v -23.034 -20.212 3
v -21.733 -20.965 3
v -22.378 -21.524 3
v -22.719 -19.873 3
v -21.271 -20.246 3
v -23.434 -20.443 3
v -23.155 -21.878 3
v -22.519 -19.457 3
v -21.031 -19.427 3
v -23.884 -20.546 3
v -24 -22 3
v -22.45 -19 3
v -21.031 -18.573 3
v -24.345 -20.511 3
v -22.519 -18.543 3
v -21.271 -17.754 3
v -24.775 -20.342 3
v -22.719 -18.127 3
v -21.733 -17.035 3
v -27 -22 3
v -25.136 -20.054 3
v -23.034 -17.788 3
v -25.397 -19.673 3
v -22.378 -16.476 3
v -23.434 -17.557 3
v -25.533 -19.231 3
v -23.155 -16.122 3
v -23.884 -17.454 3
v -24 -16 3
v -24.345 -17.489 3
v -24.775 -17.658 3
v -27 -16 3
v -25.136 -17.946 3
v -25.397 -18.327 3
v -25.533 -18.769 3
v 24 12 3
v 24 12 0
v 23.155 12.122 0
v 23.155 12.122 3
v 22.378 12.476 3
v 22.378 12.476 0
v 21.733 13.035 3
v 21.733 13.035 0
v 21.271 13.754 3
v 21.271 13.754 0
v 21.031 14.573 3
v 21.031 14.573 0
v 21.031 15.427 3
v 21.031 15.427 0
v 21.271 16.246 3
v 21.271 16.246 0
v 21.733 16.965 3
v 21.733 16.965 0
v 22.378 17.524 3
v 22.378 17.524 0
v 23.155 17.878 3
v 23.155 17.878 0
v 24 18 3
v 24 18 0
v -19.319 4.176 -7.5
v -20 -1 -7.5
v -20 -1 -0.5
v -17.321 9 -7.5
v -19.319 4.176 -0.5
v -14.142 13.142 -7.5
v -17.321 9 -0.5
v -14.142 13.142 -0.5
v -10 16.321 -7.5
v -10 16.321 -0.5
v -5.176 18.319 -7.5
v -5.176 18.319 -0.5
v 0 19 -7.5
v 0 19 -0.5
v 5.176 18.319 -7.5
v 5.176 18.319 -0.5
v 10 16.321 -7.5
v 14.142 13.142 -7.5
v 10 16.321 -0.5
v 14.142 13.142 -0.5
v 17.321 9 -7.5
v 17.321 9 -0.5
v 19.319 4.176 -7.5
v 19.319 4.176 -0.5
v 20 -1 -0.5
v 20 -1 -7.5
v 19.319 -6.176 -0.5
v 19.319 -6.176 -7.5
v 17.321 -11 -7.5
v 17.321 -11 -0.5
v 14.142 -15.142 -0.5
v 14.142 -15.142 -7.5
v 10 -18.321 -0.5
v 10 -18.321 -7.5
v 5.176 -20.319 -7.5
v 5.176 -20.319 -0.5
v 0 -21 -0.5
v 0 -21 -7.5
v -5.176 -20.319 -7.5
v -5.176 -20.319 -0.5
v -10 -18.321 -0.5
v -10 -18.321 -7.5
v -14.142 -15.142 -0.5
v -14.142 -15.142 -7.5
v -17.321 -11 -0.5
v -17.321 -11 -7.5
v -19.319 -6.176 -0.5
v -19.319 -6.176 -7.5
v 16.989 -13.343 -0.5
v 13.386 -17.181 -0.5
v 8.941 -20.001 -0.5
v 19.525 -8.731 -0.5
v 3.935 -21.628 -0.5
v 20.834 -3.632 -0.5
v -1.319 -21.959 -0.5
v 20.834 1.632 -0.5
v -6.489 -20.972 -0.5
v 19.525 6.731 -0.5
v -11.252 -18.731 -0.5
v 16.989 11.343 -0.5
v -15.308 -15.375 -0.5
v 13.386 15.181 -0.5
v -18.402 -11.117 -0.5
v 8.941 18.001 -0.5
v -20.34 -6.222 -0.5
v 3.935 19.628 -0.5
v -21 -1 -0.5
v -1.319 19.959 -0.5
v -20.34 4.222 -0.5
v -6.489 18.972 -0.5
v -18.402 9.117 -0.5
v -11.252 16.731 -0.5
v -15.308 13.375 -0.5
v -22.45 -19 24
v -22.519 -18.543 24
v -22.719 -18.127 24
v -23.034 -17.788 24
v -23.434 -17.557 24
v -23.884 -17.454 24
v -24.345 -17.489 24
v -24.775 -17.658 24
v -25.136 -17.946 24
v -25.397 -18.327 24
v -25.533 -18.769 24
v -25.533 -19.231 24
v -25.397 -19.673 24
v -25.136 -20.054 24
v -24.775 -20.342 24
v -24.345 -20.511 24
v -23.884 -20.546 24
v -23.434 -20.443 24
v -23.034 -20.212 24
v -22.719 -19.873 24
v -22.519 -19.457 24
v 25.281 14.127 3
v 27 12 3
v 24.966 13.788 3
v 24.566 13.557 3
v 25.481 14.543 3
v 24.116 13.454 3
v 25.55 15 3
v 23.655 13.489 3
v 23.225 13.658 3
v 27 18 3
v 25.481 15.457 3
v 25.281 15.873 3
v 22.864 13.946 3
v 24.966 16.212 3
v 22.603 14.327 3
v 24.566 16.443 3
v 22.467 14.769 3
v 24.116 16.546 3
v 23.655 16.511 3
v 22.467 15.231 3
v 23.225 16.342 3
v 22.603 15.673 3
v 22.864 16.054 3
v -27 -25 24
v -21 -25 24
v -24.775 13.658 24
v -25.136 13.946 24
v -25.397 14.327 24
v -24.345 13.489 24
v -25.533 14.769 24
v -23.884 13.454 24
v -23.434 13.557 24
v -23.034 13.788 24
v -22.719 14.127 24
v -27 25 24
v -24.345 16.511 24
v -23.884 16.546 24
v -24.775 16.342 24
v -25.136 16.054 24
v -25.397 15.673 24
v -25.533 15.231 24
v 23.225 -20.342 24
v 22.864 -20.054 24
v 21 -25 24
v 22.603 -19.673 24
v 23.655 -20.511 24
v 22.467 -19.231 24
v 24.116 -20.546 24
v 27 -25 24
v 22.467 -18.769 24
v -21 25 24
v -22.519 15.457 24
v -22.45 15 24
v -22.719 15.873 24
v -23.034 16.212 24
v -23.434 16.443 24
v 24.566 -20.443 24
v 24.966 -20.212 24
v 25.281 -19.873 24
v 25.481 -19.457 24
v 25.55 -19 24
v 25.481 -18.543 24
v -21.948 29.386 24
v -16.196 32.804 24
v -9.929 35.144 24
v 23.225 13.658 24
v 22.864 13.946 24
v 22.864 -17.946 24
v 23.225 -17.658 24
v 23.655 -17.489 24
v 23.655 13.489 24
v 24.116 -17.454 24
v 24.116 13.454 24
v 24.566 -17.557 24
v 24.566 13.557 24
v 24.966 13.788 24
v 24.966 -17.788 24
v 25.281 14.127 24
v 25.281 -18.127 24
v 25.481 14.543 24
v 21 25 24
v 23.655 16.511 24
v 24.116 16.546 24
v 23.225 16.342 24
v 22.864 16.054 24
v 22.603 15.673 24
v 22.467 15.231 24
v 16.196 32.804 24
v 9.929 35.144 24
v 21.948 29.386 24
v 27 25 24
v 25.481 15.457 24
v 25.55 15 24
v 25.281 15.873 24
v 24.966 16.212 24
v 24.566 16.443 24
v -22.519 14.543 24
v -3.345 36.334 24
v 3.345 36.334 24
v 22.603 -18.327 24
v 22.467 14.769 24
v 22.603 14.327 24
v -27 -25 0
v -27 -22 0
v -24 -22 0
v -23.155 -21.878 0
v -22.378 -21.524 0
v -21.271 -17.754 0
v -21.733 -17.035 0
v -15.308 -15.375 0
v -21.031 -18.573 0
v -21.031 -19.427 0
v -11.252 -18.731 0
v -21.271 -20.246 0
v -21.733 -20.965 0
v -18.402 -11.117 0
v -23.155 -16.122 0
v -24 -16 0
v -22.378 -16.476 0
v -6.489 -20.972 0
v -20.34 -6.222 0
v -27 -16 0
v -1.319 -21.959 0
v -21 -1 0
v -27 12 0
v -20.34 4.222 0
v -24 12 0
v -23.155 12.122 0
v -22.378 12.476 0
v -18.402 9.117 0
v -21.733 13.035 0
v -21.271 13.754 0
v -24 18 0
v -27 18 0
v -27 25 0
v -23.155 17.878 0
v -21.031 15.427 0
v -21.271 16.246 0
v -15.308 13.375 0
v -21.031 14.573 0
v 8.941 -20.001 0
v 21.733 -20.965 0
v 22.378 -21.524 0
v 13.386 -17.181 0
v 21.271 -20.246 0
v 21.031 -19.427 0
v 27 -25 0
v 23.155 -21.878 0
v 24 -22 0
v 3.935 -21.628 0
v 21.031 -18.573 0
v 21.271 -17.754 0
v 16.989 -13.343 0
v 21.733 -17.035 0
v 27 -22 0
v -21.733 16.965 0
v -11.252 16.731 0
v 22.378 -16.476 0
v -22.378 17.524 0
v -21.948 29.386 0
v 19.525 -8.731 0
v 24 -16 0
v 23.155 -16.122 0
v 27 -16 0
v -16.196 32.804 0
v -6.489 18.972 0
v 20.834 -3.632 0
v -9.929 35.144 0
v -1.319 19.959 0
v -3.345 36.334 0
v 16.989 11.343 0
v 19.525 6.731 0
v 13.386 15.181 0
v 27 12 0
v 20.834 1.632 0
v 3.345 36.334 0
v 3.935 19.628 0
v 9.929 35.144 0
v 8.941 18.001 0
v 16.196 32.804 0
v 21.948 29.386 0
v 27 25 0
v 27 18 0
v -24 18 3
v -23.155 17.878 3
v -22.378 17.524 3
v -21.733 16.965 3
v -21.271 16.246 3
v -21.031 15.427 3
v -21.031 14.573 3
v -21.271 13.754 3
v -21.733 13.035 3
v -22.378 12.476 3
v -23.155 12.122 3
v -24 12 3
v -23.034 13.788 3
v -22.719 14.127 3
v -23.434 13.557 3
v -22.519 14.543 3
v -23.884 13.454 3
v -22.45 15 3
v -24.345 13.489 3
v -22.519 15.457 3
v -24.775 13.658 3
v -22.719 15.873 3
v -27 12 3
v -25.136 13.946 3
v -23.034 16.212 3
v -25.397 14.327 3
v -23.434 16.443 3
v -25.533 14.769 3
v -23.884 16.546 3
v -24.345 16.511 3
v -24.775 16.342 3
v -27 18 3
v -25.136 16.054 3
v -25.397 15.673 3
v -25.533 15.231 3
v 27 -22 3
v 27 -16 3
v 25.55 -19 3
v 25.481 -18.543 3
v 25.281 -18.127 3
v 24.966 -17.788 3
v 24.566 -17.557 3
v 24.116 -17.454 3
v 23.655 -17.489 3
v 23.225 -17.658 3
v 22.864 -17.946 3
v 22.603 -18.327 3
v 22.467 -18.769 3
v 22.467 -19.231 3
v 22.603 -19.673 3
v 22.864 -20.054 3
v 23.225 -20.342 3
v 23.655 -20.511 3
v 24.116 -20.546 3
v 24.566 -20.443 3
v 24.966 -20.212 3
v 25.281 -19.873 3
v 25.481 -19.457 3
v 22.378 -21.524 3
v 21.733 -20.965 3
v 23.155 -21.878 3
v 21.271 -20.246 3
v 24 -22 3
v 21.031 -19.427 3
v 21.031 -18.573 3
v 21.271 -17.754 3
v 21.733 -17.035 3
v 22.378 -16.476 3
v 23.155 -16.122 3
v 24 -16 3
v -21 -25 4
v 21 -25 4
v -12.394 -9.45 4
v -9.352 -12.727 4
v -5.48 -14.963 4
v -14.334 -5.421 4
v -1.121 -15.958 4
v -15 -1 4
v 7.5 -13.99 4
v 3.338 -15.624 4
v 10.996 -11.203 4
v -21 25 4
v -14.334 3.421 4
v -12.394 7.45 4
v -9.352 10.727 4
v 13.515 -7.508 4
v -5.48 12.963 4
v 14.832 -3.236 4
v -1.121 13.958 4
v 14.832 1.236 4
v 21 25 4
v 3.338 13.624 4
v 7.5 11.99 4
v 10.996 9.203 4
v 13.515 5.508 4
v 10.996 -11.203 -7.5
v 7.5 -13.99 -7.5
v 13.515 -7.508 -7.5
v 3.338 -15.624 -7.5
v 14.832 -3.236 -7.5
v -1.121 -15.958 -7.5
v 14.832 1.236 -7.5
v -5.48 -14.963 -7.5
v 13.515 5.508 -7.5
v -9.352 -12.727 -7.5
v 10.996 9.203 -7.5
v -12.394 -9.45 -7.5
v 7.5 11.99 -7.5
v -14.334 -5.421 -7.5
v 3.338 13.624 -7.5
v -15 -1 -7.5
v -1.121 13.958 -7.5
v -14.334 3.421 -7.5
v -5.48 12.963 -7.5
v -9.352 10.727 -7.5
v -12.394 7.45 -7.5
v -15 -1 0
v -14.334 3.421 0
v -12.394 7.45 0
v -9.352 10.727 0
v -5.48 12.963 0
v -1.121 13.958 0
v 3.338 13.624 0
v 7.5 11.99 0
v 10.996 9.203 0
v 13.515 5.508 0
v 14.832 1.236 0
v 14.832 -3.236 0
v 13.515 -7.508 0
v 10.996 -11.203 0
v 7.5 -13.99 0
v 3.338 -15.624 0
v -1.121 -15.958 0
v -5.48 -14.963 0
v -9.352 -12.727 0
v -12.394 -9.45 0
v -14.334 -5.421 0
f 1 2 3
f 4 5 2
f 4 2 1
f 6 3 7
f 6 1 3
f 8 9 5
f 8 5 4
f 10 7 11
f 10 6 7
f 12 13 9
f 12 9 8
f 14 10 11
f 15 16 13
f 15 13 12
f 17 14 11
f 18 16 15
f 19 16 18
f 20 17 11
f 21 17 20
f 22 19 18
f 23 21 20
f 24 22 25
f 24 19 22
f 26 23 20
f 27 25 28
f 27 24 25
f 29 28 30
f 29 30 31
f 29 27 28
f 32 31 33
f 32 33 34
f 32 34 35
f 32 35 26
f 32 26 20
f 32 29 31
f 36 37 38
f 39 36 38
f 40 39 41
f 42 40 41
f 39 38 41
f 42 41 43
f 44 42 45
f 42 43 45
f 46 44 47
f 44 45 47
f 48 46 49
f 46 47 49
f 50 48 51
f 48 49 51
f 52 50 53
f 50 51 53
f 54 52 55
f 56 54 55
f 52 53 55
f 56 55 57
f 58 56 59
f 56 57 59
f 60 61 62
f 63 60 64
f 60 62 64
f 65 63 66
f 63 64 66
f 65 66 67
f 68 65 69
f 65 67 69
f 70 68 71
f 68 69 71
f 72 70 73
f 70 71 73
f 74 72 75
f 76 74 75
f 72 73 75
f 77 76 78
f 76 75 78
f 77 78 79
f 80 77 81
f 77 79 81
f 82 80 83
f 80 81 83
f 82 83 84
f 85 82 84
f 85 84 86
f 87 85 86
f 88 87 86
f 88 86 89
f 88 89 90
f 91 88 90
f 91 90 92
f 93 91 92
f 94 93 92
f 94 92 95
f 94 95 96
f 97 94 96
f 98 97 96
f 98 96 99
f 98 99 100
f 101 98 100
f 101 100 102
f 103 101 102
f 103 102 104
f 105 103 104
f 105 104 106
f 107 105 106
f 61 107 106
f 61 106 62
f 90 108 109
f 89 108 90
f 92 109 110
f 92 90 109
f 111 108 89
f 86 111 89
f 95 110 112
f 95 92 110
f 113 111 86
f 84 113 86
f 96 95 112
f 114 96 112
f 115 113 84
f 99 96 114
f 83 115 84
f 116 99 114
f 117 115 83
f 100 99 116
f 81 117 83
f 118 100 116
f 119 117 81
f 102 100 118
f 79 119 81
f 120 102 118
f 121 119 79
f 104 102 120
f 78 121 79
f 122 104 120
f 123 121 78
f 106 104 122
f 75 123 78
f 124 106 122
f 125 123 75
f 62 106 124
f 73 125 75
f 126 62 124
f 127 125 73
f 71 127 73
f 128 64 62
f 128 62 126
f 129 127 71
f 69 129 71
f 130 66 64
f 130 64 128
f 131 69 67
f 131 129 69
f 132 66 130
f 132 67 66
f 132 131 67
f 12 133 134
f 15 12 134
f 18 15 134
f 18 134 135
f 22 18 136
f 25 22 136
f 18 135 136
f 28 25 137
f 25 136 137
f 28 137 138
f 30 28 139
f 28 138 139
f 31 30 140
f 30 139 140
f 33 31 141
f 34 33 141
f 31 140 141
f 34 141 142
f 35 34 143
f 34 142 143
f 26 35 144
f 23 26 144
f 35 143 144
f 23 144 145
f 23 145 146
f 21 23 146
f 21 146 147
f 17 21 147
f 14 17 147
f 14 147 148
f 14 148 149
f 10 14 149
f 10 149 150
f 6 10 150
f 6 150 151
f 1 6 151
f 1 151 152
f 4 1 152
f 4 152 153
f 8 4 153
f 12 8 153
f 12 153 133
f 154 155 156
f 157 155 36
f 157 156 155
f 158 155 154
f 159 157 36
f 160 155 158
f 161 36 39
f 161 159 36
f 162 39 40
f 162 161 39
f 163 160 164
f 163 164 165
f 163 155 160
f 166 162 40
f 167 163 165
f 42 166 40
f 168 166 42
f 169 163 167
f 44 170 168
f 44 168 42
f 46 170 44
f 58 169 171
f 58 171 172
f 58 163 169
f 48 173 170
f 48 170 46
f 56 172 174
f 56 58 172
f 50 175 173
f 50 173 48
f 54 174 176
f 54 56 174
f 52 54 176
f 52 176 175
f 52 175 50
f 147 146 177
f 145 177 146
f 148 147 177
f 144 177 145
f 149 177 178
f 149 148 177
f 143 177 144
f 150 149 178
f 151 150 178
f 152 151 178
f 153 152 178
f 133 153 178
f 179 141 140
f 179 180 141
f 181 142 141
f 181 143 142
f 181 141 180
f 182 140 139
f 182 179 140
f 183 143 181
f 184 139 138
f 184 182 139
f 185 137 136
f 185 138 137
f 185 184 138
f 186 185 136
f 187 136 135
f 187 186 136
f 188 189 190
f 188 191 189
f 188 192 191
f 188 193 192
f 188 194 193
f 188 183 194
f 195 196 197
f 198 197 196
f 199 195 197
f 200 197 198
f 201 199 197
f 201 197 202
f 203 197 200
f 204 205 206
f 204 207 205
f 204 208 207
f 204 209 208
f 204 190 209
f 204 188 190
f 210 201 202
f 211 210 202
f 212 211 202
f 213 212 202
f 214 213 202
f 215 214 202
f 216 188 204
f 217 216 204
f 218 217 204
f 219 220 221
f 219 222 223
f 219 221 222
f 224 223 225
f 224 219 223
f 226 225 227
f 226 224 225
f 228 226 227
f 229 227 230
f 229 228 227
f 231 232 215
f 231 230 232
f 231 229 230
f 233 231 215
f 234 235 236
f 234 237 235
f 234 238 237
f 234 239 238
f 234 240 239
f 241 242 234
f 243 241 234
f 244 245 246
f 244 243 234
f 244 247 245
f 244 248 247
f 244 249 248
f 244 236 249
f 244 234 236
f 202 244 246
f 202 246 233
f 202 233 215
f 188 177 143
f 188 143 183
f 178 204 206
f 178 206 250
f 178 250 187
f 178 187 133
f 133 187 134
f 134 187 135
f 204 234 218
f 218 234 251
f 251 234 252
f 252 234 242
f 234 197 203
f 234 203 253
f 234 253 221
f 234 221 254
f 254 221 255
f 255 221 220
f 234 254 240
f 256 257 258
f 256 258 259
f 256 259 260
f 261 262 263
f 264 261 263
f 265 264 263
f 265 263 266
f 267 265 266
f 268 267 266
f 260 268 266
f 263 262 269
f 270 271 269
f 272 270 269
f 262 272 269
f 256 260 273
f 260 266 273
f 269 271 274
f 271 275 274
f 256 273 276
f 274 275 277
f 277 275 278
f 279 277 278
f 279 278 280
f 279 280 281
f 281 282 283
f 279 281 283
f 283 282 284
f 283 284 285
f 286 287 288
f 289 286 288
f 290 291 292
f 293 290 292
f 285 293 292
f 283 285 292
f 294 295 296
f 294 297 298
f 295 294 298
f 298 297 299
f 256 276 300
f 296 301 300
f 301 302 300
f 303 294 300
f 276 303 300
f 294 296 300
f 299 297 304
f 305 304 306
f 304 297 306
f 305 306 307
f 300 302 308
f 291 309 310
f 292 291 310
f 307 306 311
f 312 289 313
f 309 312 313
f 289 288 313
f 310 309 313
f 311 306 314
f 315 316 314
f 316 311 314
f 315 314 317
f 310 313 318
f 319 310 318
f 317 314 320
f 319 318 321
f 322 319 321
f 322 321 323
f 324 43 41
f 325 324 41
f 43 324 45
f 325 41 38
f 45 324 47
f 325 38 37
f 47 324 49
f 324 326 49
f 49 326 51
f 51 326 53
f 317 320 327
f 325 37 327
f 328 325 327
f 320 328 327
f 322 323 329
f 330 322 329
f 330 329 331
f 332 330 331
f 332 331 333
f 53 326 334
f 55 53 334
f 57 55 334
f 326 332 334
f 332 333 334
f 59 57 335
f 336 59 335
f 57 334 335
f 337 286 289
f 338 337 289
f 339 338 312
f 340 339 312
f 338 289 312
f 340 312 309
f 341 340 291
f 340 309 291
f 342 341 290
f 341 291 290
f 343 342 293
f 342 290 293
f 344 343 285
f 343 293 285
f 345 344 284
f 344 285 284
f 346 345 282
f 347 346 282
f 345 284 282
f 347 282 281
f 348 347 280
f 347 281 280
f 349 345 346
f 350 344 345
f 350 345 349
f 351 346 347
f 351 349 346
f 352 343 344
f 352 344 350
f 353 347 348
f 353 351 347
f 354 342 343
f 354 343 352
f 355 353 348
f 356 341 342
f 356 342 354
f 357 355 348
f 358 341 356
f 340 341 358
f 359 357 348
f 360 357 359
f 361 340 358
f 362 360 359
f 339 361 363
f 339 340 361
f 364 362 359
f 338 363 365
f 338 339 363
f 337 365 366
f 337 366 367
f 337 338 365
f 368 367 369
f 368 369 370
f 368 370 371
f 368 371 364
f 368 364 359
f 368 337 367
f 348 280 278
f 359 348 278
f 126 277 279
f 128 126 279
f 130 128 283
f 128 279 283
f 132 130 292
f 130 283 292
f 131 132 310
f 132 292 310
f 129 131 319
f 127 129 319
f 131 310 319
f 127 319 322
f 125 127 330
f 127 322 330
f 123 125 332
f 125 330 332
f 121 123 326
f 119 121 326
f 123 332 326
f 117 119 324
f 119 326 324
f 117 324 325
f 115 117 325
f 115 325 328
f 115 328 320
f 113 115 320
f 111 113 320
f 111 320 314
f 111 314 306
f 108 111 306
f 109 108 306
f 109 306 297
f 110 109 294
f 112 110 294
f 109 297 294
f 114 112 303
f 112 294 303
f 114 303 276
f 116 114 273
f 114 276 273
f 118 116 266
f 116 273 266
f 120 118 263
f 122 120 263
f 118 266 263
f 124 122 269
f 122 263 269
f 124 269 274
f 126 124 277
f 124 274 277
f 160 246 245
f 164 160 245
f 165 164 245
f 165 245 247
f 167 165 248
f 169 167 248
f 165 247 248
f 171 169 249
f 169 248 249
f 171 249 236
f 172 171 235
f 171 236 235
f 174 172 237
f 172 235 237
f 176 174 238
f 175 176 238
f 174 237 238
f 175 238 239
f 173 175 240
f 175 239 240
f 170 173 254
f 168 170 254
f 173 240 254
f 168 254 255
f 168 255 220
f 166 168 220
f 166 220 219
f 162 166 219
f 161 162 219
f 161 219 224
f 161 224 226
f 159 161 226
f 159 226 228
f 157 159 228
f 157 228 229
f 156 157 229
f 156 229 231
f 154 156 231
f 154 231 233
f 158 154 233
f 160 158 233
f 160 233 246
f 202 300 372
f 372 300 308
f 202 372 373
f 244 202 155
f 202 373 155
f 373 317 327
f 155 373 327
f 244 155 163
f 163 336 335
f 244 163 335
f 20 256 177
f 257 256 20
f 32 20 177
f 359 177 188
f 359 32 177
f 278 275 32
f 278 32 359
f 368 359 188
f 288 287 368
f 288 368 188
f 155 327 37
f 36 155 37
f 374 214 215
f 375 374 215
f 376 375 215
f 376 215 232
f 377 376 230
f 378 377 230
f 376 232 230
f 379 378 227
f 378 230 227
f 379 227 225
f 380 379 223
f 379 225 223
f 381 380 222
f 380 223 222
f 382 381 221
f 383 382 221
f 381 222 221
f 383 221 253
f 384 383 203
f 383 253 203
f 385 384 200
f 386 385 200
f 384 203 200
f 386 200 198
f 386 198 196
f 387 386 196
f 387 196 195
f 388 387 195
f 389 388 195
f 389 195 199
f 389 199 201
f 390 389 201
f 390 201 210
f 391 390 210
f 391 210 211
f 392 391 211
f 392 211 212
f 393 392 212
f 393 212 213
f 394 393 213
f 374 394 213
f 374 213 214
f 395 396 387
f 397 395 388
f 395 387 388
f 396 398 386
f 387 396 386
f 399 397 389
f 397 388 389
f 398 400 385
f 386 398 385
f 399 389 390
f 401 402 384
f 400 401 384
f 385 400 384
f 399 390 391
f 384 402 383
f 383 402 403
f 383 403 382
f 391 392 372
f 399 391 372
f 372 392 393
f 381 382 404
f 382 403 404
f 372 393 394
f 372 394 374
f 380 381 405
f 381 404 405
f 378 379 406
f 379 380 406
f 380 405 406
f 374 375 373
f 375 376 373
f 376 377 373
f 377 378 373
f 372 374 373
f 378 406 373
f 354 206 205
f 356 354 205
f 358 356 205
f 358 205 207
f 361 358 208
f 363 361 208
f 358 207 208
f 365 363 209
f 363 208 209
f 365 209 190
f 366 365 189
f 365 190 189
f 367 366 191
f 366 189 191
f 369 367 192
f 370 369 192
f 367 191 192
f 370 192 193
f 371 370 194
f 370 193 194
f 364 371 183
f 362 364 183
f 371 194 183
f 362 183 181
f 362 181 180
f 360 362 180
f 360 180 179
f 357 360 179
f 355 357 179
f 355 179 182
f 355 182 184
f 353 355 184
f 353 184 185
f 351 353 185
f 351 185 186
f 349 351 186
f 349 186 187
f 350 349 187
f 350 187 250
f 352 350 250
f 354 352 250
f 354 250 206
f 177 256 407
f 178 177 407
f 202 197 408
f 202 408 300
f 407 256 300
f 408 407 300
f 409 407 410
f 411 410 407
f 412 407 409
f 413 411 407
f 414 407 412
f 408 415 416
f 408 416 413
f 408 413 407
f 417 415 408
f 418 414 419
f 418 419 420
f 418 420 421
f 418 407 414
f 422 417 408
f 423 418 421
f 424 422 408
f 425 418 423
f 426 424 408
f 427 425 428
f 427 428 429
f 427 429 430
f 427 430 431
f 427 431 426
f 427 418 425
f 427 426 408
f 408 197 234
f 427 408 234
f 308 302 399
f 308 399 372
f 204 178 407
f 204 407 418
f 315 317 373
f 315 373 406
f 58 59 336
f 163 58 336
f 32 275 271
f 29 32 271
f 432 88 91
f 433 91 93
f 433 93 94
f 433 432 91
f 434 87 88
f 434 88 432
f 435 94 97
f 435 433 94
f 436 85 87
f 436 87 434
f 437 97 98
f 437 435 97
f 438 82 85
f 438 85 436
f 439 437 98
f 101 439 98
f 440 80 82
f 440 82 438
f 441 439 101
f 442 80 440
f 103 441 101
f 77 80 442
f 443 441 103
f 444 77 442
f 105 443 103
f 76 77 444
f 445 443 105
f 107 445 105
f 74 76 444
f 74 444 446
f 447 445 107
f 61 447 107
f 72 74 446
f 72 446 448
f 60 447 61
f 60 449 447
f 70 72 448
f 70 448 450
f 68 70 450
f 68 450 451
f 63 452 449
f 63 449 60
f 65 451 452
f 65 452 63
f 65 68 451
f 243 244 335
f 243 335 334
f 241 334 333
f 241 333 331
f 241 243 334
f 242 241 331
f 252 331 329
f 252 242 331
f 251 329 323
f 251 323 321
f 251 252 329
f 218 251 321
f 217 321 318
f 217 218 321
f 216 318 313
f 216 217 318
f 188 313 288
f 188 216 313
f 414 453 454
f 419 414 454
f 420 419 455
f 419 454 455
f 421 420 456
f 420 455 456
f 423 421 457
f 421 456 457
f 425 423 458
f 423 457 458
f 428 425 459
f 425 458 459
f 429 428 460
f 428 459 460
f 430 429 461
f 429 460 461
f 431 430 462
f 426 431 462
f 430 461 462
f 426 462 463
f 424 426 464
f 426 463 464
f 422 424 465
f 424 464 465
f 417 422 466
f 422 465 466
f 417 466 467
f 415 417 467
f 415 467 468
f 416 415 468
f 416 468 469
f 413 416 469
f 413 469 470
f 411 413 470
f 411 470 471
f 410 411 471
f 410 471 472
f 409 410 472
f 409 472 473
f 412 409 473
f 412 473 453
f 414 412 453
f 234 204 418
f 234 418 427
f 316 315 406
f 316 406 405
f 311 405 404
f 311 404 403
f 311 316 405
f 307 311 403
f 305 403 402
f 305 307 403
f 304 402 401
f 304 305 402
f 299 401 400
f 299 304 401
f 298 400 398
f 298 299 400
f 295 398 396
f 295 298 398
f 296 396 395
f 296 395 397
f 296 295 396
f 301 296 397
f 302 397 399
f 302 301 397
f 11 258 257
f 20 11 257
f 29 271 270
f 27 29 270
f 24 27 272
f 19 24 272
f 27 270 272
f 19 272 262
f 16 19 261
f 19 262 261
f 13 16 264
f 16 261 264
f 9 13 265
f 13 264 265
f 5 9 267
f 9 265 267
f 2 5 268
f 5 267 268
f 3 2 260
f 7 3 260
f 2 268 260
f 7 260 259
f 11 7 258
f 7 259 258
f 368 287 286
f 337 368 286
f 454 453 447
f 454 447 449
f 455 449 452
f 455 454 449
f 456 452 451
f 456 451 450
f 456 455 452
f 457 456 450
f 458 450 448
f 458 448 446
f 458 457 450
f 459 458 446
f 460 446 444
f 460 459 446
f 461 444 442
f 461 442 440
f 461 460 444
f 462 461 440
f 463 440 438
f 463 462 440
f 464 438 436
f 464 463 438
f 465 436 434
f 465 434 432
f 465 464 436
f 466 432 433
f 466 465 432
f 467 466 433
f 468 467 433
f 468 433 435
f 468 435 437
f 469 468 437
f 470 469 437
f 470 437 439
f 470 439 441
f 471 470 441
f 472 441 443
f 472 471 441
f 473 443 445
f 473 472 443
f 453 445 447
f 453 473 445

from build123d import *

# Parameters (mm, degrees)
SKETCH_1_W          = 54
SKETCH_1_H          = 50
EXTRUDE_1_DEPTH     = 24
SKETCH_2_R          = 1.55
CUT_EXTRUDE_1_DEPTH = 25
EXTRUDE_2_DEPTH     = 24
SKETCH_5_W          = 42
SKETCH_5_H          = 50
CUT_EXTRUDE_3_DEPTH = 20
CUT_EXTRUDE_4_DEPTH = 3
SKETCH_7_R          = 15
CUT_EXTRUDE_5_DEPTH = 25
SKETCH_11_R         = 20
SKETCH_11_R_2       = 15
EXTRUDE_3_DEPTH     = 7.5
SKETCH_12_R         = 21
SKETCH_12_R_2       = 20
EXTRUDE_4_DEPTH     = 0.5


with BuildPart() as part:
    # 草图1 → 凸台-拉伸1 (new body)
    with BuildSketch(Plane.XY):
        Rectangle(SKETCH_1_W, SKETCH_1_H)
    extrude(amount=EXTRUDE_1_DEPTH)

    # 草图2 → 切除-拉伸1 (cut, through all)
    with BuildSketch(Plane.XY.offset(24)):
        with Locations((-24, 15)):
            Circle(SKETCH_2_R)
        with Locations((24, 15)):
            Circle(SKETCH_2_R)
        with Locations((24, -19)):
            Circle(SKETCH_2_R)
        with Locations((-24, -19)):
            Circle(SKETCH_2_R)
    extrude(amount=-CUT_EXTRUDE_1_DEPTH, mode=Mode.SUBTRACT)

    # 草图3 → 凸台-拉伸2 (add)
    with BuildSketch(Plane.XY.offset(24)):
        with BuildLine():
            Line((-27, 25), (27, 25))
            ThreePointArc((27, 25), (0, 36.483329628), (-27, 25))
        make_face()
    extrude(amount=-EXTRUDE_2_DEPTH)

    # 草图5 → 切除-拉伸3 (cut)
    with BuildSketch(Plane.XY.offset(24)):
        Rectangle(SKETCH_5_W, SKETCH_5_H)
    extrude(amount=-CUT_EXTRUDE_3_DEPTH, mode=Mode.SUBTRACT)

    # 草图6 → 切除-拉伸4 (cut)
    with BuildSketch(Plane(origin=(0, 0, 0), x_dir=(-1, 0, 0), z_dir=(0, 0, -1))):
        with BuildLine():
            Line((-27, -16), (-24, -16))
            ThreePointArc((-24, -16), (-21, -19), (-24, -22))
            Line((-24, -22), (-27, -22))
            Line((-27, -22), (-27, -16))
        make_face()
        with BuildLine():
            Line((-27, 18), (-27, 12))
            Line((-27, 12), (-24, 12))
            ThreePointArc((-24, 12), (-21, 15), (-24, 18))
            Line((-24, 18), (-27, 18))
        make_face()
        with BuildLine():
            Line((27, -16), (24, -16))
            ThreePointArc((24, -16), (21, -19), (24, -22))
            Line((24, -22), (27, -22))
            Line((27, -22), (27, -16))
        make_face()
        with BuildLine():
            Line((27, 18), (24, 18))
            ThreePointArc((24, 18), (21, 15), (24, 12))
            Line((24, 12), (27, 12))
            Line((27, 12), (27, 18))
        make_face()
    extrude(amount=-CUT_EXTRUDE_4_DEPTH, mode=Mode.SUBTRACT)

    # 草图7 → 切除-拉伸5 (cut, through all)
    with BuildSketch(Plane(origin=(0, 0, 0), x_dir=(-1, 0, 0), z_dir=(0, 0, -1))):
        with Locations((0, -1)):
            Circle(SKETCH_7_R)
    extrude(amount=-CUT_EXTRUDE_5_DEPTH, mode=Mode.SUBTRACT)

    # 草图11 → 凸台-拉伸3 (add)
    with BuildSketch(Plane(origin=(0, 0, 0), x_dir=(-1, 0, 0), z_dir=(0, 0, -1))):
        with Locations((0, -1)):
            Circle(SKETCH_11_R)
        with Locations((0, -1)):
            Circle(SKETCH_11_R_2, mode=Mode.SUBTRACT)
    extrude(amount=EXTRUDE_3_DEPTH)

    # 草图12 → 凸台-拉伸4 (add)
    with BuildSketch(Plane(origin=(0, 0, 0), x_dir=(-1, 0, 0), z_dir=(0, 0, -1))):
        with Locations((0, -1)):
            Circle(SKETCH_12_R)
        with Locations((0, -1)):
            Circle(SKETCH_12_R_2, mode=Mode.SUBTRACT)
    extrude(amount=EXTRUDE_4_DEPTH)


solid = part.part
